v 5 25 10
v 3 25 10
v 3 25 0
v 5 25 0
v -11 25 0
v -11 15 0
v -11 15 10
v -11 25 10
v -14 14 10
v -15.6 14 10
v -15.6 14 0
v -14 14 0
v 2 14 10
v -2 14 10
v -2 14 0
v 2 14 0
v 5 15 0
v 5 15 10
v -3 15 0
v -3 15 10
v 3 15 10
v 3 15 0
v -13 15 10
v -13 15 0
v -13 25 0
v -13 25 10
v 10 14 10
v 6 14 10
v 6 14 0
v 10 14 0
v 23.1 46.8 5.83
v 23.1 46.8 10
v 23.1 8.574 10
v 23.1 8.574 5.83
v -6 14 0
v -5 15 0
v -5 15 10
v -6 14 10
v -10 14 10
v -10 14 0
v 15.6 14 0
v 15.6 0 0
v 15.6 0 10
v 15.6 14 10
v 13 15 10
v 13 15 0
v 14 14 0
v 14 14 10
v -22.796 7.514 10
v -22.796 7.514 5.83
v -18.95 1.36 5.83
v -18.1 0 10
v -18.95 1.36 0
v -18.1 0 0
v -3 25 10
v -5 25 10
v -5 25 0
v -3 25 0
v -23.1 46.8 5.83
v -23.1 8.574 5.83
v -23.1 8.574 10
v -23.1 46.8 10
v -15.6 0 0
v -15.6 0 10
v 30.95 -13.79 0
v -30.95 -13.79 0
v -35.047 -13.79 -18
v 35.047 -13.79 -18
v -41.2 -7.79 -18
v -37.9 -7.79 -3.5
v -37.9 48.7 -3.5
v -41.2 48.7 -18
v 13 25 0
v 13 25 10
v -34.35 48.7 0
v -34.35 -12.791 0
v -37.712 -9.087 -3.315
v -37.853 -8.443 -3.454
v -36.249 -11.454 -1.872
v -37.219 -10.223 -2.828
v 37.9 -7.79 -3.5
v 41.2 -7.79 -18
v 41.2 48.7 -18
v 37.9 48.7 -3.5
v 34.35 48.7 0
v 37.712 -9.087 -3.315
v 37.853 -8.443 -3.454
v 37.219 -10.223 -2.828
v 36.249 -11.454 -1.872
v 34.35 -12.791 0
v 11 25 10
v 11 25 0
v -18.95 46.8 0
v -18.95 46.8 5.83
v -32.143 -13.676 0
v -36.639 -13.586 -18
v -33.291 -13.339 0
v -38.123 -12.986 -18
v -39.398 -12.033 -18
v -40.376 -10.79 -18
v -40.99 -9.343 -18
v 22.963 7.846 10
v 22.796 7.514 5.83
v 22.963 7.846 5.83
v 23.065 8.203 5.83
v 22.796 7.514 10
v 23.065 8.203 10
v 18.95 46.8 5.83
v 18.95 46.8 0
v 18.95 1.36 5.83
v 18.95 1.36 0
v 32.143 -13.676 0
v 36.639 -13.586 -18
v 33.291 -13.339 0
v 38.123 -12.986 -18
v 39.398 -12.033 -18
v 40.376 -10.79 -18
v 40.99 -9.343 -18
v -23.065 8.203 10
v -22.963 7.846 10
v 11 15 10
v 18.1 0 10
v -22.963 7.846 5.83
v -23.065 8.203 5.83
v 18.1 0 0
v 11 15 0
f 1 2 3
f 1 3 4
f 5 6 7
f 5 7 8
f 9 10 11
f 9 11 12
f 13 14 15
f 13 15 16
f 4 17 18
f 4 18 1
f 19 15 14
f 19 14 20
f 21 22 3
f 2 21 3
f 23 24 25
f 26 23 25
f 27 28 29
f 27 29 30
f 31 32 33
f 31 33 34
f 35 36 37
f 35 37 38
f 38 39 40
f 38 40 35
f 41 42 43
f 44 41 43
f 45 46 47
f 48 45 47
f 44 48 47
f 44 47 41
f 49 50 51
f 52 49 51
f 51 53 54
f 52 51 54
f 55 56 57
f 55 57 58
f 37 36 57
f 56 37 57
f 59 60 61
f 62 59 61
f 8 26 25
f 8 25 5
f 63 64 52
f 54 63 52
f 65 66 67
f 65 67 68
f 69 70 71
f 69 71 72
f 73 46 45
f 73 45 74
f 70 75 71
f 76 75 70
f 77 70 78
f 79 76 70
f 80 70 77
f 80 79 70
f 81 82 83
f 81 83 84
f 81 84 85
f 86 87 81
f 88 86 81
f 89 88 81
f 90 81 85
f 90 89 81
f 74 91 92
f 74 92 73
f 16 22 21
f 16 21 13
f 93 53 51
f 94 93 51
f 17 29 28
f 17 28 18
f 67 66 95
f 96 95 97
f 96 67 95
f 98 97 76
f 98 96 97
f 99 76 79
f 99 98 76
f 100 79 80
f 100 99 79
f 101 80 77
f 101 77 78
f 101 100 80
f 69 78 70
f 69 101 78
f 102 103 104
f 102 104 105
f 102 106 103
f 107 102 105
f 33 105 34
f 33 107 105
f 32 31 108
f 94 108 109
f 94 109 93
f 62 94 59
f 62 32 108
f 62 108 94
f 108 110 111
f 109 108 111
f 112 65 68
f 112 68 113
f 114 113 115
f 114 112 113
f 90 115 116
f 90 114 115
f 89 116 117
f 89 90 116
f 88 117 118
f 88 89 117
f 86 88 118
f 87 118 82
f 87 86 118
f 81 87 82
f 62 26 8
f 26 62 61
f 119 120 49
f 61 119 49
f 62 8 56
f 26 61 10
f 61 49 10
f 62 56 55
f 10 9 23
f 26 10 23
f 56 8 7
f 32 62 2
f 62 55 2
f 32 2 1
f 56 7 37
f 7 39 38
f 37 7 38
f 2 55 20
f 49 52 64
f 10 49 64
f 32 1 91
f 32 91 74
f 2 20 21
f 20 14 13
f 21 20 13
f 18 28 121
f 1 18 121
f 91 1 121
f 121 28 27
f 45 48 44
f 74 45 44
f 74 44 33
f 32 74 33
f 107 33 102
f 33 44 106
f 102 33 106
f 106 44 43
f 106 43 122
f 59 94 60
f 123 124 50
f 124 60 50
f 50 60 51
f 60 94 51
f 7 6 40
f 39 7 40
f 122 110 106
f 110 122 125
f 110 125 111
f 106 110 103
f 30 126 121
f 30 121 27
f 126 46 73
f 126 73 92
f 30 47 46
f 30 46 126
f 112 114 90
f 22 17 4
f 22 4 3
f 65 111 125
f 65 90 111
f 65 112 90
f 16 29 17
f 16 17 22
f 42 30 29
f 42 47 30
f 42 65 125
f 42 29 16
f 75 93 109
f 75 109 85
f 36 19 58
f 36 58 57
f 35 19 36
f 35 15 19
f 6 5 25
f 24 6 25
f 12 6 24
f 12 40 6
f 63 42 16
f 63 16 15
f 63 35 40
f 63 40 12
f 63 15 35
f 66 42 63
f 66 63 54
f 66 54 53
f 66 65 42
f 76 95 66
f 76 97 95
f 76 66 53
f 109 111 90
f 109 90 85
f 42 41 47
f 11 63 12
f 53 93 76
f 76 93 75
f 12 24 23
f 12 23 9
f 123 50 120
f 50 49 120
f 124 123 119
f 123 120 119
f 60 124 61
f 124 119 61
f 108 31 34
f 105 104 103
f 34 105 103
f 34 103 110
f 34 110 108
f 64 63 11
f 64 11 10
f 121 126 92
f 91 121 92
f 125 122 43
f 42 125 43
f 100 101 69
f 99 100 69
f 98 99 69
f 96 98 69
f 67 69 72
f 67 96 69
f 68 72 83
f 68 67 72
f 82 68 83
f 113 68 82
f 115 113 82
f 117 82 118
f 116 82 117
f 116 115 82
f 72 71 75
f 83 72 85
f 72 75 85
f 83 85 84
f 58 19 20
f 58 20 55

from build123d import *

# Parameters (mm, degrees)
PAD_DEPTH       = 13.79
PAD001_DEPTH    = 48.7
PAD002_DEPTH    = 46.8
SKETCH002_W     = 31.2
SKETCH002_H     = 10
POCKET_DEPTH    = 14
POCKET001_DEPTH = 10
FILLET_R        = 6
SKETCH004_W     = 2
SKETCH004_H     = 11
POCKET002_DEPTH = 10
POCKET003_DEPTH = 10
FILLET001_R     = 2


with BuildPart() as part:
    # Sketch → Pad (new body)
    with BuildSketch(Plane.XZ):
        Polygon((34.35, 0), (-34.35, 0), (-37.9, -3.5), (-41.2, -18), (41.2, -18), (37.9, -3.5), align=None)
    extrude(amount=PAD_DEPTH)

    # Sketch → Pad001 (join)
    with BuildSketch(Plane.XZ):
        Polygon((34.35, 0), (-34.35, 0), (-37.9, -3.5), (-41.2, -18), (41.2, -18), (37.9, -3.5), align=None)
    extrude(amount=-PAD001_DEPTH)

    # Sketch001 → Pad002 (join)
    with BuildSketch(Plane.XZ):
        Polygon((-18.95, 0), (-18.95, 5.83), (-23.1, 5.83), (-23.1, 10), (23.1, 10), (23.1, 5.83), (18.95, 5.83), (18.95, 0), align=None)
    extrude(amount=-PAD002_DEPTH)

    # Sketch002 → Pocket (cut)
    with BuildSketch(Plane.XZ):
        with Locations((0, 5)):
            Rectangle(SKETCH002_W, SKETCH002_H)
    extrude(amount=-POCKET_DEPTH, mode=Mode.SUBTRACT)

    # Sketch003 → Pocket001 (cut)
    with BuildSketch(Plane.XY):
        Polygon((18.1, 0), (23.1, 8), (23.1, 0), align=None)
        Polygon((-23.1, 0), (-23.1, 8), (-18.1, 0), align=None)
    extrude(amount=POCKET001_DEPTH, mode=Mode.SUBTRACT)

    # Fillet
    fillet_edges = [part.edges().sort_by_distance(p)[0] for p in [
        (39.55, -13.79, -10.75),
        (-39.55, -13.79, -10.75),
    ]]
    fillet(fillet_edges, radius=FILLET_R)

    # Sketch004 → Pocket002 (cut)
    with BuildSketch(Plane.XY):
        with Locations((-12, 19.5)):
            Rectangle(SKETCH004_W, SKETCH004_H)
        with Locations((-4, 19.5)):
            Rectangle(SKETCH004_W, SKETCH004_H)
        with Locations((4, 19.5)):
            Rectangle(SKETCH004_W, SKETCH004_H)
        with Locations((12, 19.5)):
            Rectangle(SKETCH004_W, SKETCH004_H)
    extrude(amount=POCKET002_DEPTH, mode=Mode.SUBTRACT)

    # Sketch005 (on Face25 of Pocket002) → Pocket003 (cut)
    with BuildSketch(Plane(origin=(0, 0, 10), x_dir=(-1, 0, 0), z_dir=(0, 0, 1))):
        Polygon((13, -15), (14, -14), (13, -14), align=None)
        Polygon((11, -14), (11, -15), (10, -14), align=None)
        Polygon((5, -15), (6, -14), (5, -14), align=None)
        Polygon((2, -14), (3, -15), (3, -14), align=None)
        Polygon((-3, -14), (-3, -15), (-2, -14), align=None)
        Polygon((-6, -14), (-5, -15), (-5, -14), align=None)
        Polygon((-11, -14), (-11, -15), (-10, -14), align=None)
        Polygon((-13, -14), (-13, -15), (-14, -14), align=None)
    extrude(amount=-POCKET003_DEPTH, mode=Mode.SUBTRACT)

    # Fillet001
    fillet001_edges = [part.edges().sort_by_distance(p)[0] for p in [
        (23.1, 8, 7.915),
        (-23.1, 8, 7.915),
    ]]
    fillet(fillet001_edges, radius=FILLET001_R)


solid = part.part
